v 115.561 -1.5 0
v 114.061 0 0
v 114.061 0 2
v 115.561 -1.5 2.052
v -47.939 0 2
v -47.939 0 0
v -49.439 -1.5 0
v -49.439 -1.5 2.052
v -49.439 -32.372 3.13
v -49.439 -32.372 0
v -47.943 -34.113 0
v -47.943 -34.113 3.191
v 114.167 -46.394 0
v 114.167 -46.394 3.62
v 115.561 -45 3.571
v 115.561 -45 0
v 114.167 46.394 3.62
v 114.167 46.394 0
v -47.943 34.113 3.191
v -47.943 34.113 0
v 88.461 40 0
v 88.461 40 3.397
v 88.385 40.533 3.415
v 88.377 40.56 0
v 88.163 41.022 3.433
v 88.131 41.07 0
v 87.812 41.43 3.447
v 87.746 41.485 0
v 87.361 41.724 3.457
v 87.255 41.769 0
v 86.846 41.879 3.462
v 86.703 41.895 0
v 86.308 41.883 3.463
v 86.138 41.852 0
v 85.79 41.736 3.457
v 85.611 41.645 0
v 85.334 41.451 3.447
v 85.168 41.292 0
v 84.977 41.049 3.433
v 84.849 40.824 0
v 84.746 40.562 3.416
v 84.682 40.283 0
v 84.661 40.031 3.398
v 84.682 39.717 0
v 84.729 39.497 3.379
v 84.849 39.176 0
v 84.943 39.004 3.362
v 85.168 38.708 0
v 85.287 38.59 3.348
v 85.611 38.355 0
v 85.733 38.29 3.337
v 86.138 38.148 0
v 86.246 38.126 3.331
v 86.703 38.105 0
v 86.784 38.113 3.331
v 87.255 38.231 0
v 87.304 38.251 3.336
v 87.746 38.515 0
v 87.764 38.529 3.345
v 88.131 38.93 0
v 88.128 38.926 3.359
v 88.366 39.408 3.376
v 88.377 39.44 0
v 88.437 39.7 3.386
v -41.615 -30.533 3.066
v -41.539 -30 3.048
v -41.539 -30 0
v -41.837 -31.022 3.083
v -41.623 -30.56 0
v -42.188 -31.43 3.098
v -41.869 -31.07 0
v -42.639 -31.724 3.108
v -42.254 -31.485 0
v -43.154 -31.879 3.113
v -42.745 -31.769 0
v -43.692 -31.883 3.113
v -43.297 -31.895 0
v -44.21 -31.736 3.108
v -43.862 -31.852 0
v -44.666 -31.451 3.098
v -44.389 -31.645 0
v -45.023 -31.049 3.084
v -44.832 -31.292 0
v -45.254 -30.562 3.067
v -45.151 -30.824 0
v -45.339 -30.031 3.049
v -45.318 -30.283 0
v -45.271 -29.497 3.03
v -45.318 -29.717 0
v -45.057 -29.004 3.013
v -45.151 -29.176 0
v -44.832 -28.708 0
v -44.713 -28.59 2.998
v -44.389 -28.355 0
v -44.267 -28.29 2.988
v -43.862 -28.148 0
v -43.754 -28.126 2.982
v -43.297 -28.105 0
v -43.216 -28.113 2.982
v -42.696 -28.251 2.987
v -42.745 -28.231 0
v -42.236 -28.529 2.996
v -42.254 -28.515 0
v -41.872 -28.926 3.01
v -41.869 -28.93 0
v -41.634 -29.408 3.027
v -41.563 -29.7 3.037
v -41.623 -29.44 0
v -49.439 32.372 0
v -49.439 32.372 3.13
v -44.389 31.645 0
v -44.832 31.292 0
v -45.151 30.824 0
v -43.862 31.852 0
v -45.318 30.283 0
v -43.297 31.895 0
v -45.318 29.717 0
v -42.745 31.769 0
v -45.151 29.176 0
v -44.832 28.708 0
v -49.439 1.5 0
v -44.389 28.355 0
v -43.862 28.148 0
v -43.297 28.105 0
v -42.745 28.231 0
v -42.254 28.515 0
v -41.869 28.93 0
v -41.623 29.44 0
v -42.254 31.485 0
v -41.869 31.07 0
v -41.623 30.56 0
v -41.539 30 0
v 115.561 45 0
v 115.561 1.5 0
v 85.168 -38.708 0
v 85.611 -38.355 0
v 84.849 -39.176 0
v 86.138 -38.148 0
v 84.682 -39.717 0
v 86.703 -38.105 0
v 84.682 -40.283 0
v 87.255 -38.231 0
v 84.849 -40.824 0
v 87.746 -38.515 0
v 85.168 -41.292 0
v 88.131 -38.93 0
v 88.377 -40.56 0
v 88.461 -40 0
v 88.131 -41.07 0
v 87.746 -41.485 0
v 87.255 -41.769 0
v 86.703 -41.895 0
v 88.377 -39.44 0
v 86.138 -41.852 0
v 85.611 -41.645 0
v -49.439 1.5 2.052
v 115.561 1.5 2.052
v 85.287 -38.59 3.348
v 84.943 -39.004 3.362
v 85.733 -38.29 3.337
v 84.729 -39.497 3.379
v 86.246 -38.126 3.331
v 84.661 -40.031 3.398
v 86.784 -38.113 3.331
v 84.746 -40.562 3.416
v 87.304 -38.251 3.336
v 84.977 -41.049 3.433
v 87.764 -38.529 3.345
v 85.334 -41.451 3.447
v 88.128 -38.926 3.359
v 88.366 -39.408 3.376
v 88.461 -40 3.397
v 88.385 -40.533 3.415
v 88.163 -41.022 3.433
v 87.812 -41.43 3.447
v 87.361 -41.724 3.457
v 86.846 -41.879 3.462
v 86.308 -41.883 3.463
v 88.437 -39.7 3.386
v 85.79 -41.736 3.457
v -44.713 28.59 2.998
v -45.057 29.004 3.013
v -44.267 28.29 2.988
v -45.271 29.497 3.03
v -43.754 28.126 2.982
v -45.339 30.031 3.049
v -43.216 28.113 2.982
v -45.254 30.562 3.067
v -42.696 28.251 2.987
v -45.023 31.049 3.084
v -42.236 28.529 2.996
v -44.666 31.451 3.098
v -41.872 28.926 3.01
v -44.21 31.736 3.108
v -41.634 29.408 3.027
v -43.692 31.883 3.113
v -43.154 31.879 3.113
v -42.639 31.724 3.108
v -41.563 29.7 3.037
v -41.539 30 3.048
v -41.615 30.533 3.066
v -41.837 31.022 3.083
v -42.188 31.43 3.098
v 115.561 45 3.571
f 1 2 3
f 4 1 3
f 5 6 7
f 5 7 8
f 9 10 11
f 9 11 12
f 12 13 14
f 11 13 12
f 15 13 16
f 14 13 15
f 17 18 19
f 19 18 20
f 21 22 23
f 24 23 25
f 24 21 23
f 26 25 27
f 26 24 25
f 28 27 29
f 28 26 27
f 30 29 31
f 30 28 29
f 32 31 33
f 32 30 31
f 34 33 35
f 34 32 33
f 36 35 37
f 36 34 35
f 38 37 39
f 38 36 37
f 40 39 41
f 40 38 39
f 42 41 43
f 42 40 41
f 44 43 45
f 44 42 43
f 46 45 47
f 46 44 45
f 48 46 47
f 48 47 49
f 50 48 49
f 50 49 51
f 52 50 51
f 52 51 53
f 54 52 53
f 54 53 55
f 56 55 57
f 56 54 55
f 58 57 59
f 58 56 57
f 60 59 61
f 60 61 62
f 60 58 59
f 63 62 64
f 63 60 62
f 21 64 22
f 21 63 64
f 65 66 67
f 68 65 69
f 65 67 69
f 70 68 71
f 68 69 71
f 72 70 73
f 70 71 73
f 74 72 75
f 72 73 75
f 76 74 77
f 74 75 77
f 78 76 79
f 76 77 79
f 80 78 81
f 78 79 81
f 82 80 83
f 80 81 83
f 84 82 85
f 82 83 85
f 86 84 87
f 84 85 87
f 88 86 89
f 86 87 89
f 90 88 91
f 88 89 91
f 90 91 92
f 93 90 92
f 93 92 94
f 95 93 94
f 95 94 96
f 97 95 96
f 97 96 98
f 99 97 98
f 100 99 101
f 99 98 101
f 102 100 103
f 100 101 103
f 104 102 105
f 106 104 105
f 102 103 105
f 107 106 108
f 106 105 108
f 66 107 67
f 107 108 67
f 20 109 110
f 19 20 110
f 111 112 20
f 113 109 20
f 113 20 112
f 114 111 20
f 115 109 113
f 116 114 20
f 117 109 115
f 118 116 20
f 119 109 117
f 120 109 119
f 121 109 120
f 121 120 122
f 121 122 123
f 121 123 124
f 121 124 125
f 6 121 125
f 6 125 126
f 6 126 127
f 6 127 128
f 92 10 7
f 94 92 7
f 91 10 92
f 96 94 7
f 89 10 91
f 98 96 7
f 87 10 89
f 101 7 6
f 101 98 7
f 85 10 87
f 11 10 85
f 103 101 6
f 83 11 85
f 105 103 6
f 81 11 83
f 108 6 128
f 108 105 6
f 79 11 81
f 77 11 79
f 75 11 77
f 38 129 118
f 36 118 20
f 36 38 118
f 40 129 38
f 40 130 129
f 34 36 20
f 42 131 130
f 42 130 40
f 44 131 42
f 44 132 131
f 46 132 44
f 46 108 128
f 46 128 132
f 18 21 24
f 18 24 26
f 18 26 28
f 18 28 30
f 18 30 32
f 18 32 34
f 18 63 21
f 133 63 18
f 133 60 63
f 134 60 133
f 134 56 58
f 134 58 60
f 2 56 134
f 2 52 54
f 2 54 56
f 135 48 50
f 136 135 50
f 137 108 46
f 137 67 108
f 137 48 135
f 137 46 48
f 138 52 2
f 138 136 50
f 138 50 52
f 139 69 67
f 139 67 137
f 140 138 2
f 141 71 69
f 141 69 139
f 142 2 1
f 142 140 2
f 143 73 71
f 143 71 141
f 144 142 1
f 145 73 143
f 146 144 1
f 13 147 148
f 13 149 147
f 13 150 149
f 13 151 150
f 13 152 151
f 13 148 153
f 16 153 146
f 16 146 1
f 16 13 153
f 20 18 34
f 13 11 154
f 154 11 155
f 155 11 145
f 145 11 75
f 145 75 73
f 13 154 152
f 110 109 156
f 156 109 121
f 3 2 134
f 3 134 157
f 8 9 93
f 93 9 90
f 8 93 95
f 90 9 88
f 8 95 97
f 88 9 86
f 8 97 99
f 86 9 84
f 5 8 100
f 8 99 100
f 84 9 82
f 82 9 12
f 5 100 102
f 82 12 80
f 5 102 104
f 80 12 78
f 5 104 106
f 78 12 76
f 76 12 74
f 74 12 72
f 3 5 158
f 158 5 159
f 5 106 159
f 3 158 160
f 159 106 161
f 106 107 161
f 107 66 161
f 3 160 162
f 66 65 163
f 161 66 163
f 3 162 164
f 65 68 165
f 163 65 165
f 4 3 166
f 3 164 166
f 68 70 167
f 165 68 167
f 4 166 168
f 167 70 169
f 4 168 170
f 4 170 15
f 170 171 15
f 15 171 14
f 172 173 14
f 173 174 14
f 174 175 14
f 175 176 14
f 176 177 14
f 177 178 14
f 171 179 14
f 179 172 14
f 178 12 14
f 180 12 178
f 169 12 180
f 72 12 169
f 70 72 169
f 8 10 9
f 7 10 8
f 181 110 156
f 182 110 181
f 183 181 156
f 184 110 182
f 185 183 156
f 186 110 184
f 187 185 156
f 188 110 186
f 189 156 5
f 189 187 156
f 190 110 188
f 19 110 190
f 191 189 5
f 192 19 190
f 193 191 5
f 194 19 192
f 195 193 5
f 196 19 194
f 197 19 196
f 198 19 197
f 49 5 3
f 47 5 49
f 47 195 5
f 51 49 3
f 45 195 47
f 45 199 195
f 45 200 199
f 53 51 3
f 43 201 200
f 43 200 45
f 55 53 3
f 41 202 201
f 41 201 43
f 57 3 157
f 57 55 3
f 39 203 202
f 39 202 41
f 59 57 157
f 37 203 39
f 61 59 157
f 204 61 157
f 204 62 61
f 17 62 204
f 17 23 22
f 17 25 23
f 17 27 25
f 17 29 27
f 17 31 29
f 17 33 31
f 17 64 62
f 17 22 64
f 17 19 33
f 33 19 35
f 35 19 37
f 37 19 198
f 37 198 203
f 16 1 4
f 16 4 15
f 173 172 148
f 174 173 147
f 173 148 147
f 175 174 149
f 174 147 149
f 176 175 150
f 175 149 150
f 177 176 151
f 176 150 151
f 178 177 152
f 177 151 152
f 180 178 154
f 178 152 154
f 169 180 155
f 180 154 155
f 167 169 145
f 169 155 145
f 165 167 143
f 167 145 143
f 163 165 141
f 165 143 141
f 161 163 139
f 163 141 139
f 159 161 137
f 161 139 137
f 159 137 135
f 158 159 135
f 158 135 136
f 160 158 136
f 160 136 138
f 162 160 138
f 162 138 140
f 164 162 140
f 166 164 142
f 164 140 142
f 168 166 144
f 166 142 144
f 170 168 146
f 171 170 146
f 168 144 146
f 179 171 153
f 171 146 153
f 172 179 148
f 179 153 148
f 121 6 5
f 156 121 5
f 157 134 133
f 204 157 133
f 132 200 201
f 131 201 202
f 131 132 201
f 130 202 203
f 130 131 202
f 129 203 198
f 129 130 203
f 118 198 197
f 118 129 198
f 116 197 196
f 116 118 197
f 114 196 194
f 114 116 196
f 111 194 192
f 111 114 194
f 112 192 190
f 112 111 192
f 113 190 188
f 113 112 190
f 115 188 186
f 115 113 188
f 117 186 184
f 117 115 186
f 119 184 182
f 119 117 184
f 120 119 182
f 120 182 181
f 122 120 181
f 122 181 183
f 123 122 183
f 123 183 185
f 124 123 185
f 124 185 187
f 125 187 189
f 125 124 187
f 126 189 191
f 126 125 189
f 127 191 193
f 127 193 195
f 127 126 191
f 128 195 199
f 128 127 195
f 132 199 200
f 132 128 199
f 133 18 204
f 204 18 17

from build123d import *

# Parameters (mm, degrees)
ESQUISSE1_R      = 1.9
EXTRUSION1_DEPTH = 2
D_POUILLE1_ANGLE = 2
CHANFREIN1_SIZE  = 1.5
CHANFREIN1_SIZE2 = 1.398361753
CHANFREIN2_SIZE  = 1.5
CHANFREIN3_SIZE  = 1.5
CHANFREIN4_SIZE  = 1.5
CHANFREIN4_SIZE2 = 1.627601385


with BuildPart() as part:
    # Esquisse1 → Extrusion1 (new body)
    with BuildSketch(Plane.XY):
        Polygon((-49.438888889, 0), (115.561111111, 0), (115.561111111, 46.5), (-49.438888889, 34), align=None)
        with Locations((86.561111111, 40)):
            Circle(ESQUISSE1_R, mode=Mode.SUBTRACT)
        with Locations((-43.438888889, 30)):
            Circle(ESQUISSE1_R, mode=Mode.SUBTRACT)
    extrude(amount=EXTRUSION1_DEPTH)

    # Dépouille1
    d_pouille1_faces = [part.faces().sort_by_distance(p)[0] for p in [
        (37.385342989, 20.236326134, 2),
    ]]
    draft(d_pouille1_faces, Plane(origin=(-49.438888889, 0, 2), x_dir=(0, 0, -1), z_dir=(0, -1, 0)), D_POUILLE1_ANGLE)

    # Chanfrein1
    chanfrein1_edges = [part.edges().sort_by_distance(p)[0] for p in [
        (115.561111111, 46.5, 1.811907891),
    ]]
    chanfrein1_side = [part.faces().sort_by_distance(p)[0] for p in [
        (115.561111111, 25.487728403, 1.445025544),
    ]]
    chamfer(chanfrein1_edges, length=CHANFREIN1_SIZE, length2=CHANFREIN1_SIZE2, reference=chanfrein1_side[0])

    # Chanfrein2
    chanfrein2_edges = [part.edges().sort_by_distance(p)[0] for p in [
        (115.561111111, 0, 1),
    ]]
    chamfer(chanfrein2_edges, length=CHANFREIN2_SIZE)

    # Chanfrein3
    chanfrein3_edges = [part.edges().sort_by_distance(p)[0] for p in [
        (-49.438888889, 0, 1),
    ]]
    chamfer(chanfrein3_edges, length=CHANFREIN3_SIZE)

    # Chanfrein4
    chanfrein4_edges = [part.edges().sort_by_distance(p)[0] for p in [
        (-49.438888889, 34, 1.593653081),
    ]]
    chanfrein4_side = [part.faces().sort_by_distance(p)[0] for p in [
        (34.097619228, 40.328523342, 1.704151534),
    ]]
    chamfer(chanfrein4_edges, length=CHANFREIN4_SIZE, length2=CHANFREIN4_SIZE2, reference=chanfrein4_side[0])

    # Symétrie1: part across plane


with BuildPart() as part_1:
    add(part.part)
    add(part.part.mirror(Plane(origin=(-49.438888889, 0, 2), x_dir=(0, 0, 1), z_dir=(0, 1, 0))))


solid = part_1.part
